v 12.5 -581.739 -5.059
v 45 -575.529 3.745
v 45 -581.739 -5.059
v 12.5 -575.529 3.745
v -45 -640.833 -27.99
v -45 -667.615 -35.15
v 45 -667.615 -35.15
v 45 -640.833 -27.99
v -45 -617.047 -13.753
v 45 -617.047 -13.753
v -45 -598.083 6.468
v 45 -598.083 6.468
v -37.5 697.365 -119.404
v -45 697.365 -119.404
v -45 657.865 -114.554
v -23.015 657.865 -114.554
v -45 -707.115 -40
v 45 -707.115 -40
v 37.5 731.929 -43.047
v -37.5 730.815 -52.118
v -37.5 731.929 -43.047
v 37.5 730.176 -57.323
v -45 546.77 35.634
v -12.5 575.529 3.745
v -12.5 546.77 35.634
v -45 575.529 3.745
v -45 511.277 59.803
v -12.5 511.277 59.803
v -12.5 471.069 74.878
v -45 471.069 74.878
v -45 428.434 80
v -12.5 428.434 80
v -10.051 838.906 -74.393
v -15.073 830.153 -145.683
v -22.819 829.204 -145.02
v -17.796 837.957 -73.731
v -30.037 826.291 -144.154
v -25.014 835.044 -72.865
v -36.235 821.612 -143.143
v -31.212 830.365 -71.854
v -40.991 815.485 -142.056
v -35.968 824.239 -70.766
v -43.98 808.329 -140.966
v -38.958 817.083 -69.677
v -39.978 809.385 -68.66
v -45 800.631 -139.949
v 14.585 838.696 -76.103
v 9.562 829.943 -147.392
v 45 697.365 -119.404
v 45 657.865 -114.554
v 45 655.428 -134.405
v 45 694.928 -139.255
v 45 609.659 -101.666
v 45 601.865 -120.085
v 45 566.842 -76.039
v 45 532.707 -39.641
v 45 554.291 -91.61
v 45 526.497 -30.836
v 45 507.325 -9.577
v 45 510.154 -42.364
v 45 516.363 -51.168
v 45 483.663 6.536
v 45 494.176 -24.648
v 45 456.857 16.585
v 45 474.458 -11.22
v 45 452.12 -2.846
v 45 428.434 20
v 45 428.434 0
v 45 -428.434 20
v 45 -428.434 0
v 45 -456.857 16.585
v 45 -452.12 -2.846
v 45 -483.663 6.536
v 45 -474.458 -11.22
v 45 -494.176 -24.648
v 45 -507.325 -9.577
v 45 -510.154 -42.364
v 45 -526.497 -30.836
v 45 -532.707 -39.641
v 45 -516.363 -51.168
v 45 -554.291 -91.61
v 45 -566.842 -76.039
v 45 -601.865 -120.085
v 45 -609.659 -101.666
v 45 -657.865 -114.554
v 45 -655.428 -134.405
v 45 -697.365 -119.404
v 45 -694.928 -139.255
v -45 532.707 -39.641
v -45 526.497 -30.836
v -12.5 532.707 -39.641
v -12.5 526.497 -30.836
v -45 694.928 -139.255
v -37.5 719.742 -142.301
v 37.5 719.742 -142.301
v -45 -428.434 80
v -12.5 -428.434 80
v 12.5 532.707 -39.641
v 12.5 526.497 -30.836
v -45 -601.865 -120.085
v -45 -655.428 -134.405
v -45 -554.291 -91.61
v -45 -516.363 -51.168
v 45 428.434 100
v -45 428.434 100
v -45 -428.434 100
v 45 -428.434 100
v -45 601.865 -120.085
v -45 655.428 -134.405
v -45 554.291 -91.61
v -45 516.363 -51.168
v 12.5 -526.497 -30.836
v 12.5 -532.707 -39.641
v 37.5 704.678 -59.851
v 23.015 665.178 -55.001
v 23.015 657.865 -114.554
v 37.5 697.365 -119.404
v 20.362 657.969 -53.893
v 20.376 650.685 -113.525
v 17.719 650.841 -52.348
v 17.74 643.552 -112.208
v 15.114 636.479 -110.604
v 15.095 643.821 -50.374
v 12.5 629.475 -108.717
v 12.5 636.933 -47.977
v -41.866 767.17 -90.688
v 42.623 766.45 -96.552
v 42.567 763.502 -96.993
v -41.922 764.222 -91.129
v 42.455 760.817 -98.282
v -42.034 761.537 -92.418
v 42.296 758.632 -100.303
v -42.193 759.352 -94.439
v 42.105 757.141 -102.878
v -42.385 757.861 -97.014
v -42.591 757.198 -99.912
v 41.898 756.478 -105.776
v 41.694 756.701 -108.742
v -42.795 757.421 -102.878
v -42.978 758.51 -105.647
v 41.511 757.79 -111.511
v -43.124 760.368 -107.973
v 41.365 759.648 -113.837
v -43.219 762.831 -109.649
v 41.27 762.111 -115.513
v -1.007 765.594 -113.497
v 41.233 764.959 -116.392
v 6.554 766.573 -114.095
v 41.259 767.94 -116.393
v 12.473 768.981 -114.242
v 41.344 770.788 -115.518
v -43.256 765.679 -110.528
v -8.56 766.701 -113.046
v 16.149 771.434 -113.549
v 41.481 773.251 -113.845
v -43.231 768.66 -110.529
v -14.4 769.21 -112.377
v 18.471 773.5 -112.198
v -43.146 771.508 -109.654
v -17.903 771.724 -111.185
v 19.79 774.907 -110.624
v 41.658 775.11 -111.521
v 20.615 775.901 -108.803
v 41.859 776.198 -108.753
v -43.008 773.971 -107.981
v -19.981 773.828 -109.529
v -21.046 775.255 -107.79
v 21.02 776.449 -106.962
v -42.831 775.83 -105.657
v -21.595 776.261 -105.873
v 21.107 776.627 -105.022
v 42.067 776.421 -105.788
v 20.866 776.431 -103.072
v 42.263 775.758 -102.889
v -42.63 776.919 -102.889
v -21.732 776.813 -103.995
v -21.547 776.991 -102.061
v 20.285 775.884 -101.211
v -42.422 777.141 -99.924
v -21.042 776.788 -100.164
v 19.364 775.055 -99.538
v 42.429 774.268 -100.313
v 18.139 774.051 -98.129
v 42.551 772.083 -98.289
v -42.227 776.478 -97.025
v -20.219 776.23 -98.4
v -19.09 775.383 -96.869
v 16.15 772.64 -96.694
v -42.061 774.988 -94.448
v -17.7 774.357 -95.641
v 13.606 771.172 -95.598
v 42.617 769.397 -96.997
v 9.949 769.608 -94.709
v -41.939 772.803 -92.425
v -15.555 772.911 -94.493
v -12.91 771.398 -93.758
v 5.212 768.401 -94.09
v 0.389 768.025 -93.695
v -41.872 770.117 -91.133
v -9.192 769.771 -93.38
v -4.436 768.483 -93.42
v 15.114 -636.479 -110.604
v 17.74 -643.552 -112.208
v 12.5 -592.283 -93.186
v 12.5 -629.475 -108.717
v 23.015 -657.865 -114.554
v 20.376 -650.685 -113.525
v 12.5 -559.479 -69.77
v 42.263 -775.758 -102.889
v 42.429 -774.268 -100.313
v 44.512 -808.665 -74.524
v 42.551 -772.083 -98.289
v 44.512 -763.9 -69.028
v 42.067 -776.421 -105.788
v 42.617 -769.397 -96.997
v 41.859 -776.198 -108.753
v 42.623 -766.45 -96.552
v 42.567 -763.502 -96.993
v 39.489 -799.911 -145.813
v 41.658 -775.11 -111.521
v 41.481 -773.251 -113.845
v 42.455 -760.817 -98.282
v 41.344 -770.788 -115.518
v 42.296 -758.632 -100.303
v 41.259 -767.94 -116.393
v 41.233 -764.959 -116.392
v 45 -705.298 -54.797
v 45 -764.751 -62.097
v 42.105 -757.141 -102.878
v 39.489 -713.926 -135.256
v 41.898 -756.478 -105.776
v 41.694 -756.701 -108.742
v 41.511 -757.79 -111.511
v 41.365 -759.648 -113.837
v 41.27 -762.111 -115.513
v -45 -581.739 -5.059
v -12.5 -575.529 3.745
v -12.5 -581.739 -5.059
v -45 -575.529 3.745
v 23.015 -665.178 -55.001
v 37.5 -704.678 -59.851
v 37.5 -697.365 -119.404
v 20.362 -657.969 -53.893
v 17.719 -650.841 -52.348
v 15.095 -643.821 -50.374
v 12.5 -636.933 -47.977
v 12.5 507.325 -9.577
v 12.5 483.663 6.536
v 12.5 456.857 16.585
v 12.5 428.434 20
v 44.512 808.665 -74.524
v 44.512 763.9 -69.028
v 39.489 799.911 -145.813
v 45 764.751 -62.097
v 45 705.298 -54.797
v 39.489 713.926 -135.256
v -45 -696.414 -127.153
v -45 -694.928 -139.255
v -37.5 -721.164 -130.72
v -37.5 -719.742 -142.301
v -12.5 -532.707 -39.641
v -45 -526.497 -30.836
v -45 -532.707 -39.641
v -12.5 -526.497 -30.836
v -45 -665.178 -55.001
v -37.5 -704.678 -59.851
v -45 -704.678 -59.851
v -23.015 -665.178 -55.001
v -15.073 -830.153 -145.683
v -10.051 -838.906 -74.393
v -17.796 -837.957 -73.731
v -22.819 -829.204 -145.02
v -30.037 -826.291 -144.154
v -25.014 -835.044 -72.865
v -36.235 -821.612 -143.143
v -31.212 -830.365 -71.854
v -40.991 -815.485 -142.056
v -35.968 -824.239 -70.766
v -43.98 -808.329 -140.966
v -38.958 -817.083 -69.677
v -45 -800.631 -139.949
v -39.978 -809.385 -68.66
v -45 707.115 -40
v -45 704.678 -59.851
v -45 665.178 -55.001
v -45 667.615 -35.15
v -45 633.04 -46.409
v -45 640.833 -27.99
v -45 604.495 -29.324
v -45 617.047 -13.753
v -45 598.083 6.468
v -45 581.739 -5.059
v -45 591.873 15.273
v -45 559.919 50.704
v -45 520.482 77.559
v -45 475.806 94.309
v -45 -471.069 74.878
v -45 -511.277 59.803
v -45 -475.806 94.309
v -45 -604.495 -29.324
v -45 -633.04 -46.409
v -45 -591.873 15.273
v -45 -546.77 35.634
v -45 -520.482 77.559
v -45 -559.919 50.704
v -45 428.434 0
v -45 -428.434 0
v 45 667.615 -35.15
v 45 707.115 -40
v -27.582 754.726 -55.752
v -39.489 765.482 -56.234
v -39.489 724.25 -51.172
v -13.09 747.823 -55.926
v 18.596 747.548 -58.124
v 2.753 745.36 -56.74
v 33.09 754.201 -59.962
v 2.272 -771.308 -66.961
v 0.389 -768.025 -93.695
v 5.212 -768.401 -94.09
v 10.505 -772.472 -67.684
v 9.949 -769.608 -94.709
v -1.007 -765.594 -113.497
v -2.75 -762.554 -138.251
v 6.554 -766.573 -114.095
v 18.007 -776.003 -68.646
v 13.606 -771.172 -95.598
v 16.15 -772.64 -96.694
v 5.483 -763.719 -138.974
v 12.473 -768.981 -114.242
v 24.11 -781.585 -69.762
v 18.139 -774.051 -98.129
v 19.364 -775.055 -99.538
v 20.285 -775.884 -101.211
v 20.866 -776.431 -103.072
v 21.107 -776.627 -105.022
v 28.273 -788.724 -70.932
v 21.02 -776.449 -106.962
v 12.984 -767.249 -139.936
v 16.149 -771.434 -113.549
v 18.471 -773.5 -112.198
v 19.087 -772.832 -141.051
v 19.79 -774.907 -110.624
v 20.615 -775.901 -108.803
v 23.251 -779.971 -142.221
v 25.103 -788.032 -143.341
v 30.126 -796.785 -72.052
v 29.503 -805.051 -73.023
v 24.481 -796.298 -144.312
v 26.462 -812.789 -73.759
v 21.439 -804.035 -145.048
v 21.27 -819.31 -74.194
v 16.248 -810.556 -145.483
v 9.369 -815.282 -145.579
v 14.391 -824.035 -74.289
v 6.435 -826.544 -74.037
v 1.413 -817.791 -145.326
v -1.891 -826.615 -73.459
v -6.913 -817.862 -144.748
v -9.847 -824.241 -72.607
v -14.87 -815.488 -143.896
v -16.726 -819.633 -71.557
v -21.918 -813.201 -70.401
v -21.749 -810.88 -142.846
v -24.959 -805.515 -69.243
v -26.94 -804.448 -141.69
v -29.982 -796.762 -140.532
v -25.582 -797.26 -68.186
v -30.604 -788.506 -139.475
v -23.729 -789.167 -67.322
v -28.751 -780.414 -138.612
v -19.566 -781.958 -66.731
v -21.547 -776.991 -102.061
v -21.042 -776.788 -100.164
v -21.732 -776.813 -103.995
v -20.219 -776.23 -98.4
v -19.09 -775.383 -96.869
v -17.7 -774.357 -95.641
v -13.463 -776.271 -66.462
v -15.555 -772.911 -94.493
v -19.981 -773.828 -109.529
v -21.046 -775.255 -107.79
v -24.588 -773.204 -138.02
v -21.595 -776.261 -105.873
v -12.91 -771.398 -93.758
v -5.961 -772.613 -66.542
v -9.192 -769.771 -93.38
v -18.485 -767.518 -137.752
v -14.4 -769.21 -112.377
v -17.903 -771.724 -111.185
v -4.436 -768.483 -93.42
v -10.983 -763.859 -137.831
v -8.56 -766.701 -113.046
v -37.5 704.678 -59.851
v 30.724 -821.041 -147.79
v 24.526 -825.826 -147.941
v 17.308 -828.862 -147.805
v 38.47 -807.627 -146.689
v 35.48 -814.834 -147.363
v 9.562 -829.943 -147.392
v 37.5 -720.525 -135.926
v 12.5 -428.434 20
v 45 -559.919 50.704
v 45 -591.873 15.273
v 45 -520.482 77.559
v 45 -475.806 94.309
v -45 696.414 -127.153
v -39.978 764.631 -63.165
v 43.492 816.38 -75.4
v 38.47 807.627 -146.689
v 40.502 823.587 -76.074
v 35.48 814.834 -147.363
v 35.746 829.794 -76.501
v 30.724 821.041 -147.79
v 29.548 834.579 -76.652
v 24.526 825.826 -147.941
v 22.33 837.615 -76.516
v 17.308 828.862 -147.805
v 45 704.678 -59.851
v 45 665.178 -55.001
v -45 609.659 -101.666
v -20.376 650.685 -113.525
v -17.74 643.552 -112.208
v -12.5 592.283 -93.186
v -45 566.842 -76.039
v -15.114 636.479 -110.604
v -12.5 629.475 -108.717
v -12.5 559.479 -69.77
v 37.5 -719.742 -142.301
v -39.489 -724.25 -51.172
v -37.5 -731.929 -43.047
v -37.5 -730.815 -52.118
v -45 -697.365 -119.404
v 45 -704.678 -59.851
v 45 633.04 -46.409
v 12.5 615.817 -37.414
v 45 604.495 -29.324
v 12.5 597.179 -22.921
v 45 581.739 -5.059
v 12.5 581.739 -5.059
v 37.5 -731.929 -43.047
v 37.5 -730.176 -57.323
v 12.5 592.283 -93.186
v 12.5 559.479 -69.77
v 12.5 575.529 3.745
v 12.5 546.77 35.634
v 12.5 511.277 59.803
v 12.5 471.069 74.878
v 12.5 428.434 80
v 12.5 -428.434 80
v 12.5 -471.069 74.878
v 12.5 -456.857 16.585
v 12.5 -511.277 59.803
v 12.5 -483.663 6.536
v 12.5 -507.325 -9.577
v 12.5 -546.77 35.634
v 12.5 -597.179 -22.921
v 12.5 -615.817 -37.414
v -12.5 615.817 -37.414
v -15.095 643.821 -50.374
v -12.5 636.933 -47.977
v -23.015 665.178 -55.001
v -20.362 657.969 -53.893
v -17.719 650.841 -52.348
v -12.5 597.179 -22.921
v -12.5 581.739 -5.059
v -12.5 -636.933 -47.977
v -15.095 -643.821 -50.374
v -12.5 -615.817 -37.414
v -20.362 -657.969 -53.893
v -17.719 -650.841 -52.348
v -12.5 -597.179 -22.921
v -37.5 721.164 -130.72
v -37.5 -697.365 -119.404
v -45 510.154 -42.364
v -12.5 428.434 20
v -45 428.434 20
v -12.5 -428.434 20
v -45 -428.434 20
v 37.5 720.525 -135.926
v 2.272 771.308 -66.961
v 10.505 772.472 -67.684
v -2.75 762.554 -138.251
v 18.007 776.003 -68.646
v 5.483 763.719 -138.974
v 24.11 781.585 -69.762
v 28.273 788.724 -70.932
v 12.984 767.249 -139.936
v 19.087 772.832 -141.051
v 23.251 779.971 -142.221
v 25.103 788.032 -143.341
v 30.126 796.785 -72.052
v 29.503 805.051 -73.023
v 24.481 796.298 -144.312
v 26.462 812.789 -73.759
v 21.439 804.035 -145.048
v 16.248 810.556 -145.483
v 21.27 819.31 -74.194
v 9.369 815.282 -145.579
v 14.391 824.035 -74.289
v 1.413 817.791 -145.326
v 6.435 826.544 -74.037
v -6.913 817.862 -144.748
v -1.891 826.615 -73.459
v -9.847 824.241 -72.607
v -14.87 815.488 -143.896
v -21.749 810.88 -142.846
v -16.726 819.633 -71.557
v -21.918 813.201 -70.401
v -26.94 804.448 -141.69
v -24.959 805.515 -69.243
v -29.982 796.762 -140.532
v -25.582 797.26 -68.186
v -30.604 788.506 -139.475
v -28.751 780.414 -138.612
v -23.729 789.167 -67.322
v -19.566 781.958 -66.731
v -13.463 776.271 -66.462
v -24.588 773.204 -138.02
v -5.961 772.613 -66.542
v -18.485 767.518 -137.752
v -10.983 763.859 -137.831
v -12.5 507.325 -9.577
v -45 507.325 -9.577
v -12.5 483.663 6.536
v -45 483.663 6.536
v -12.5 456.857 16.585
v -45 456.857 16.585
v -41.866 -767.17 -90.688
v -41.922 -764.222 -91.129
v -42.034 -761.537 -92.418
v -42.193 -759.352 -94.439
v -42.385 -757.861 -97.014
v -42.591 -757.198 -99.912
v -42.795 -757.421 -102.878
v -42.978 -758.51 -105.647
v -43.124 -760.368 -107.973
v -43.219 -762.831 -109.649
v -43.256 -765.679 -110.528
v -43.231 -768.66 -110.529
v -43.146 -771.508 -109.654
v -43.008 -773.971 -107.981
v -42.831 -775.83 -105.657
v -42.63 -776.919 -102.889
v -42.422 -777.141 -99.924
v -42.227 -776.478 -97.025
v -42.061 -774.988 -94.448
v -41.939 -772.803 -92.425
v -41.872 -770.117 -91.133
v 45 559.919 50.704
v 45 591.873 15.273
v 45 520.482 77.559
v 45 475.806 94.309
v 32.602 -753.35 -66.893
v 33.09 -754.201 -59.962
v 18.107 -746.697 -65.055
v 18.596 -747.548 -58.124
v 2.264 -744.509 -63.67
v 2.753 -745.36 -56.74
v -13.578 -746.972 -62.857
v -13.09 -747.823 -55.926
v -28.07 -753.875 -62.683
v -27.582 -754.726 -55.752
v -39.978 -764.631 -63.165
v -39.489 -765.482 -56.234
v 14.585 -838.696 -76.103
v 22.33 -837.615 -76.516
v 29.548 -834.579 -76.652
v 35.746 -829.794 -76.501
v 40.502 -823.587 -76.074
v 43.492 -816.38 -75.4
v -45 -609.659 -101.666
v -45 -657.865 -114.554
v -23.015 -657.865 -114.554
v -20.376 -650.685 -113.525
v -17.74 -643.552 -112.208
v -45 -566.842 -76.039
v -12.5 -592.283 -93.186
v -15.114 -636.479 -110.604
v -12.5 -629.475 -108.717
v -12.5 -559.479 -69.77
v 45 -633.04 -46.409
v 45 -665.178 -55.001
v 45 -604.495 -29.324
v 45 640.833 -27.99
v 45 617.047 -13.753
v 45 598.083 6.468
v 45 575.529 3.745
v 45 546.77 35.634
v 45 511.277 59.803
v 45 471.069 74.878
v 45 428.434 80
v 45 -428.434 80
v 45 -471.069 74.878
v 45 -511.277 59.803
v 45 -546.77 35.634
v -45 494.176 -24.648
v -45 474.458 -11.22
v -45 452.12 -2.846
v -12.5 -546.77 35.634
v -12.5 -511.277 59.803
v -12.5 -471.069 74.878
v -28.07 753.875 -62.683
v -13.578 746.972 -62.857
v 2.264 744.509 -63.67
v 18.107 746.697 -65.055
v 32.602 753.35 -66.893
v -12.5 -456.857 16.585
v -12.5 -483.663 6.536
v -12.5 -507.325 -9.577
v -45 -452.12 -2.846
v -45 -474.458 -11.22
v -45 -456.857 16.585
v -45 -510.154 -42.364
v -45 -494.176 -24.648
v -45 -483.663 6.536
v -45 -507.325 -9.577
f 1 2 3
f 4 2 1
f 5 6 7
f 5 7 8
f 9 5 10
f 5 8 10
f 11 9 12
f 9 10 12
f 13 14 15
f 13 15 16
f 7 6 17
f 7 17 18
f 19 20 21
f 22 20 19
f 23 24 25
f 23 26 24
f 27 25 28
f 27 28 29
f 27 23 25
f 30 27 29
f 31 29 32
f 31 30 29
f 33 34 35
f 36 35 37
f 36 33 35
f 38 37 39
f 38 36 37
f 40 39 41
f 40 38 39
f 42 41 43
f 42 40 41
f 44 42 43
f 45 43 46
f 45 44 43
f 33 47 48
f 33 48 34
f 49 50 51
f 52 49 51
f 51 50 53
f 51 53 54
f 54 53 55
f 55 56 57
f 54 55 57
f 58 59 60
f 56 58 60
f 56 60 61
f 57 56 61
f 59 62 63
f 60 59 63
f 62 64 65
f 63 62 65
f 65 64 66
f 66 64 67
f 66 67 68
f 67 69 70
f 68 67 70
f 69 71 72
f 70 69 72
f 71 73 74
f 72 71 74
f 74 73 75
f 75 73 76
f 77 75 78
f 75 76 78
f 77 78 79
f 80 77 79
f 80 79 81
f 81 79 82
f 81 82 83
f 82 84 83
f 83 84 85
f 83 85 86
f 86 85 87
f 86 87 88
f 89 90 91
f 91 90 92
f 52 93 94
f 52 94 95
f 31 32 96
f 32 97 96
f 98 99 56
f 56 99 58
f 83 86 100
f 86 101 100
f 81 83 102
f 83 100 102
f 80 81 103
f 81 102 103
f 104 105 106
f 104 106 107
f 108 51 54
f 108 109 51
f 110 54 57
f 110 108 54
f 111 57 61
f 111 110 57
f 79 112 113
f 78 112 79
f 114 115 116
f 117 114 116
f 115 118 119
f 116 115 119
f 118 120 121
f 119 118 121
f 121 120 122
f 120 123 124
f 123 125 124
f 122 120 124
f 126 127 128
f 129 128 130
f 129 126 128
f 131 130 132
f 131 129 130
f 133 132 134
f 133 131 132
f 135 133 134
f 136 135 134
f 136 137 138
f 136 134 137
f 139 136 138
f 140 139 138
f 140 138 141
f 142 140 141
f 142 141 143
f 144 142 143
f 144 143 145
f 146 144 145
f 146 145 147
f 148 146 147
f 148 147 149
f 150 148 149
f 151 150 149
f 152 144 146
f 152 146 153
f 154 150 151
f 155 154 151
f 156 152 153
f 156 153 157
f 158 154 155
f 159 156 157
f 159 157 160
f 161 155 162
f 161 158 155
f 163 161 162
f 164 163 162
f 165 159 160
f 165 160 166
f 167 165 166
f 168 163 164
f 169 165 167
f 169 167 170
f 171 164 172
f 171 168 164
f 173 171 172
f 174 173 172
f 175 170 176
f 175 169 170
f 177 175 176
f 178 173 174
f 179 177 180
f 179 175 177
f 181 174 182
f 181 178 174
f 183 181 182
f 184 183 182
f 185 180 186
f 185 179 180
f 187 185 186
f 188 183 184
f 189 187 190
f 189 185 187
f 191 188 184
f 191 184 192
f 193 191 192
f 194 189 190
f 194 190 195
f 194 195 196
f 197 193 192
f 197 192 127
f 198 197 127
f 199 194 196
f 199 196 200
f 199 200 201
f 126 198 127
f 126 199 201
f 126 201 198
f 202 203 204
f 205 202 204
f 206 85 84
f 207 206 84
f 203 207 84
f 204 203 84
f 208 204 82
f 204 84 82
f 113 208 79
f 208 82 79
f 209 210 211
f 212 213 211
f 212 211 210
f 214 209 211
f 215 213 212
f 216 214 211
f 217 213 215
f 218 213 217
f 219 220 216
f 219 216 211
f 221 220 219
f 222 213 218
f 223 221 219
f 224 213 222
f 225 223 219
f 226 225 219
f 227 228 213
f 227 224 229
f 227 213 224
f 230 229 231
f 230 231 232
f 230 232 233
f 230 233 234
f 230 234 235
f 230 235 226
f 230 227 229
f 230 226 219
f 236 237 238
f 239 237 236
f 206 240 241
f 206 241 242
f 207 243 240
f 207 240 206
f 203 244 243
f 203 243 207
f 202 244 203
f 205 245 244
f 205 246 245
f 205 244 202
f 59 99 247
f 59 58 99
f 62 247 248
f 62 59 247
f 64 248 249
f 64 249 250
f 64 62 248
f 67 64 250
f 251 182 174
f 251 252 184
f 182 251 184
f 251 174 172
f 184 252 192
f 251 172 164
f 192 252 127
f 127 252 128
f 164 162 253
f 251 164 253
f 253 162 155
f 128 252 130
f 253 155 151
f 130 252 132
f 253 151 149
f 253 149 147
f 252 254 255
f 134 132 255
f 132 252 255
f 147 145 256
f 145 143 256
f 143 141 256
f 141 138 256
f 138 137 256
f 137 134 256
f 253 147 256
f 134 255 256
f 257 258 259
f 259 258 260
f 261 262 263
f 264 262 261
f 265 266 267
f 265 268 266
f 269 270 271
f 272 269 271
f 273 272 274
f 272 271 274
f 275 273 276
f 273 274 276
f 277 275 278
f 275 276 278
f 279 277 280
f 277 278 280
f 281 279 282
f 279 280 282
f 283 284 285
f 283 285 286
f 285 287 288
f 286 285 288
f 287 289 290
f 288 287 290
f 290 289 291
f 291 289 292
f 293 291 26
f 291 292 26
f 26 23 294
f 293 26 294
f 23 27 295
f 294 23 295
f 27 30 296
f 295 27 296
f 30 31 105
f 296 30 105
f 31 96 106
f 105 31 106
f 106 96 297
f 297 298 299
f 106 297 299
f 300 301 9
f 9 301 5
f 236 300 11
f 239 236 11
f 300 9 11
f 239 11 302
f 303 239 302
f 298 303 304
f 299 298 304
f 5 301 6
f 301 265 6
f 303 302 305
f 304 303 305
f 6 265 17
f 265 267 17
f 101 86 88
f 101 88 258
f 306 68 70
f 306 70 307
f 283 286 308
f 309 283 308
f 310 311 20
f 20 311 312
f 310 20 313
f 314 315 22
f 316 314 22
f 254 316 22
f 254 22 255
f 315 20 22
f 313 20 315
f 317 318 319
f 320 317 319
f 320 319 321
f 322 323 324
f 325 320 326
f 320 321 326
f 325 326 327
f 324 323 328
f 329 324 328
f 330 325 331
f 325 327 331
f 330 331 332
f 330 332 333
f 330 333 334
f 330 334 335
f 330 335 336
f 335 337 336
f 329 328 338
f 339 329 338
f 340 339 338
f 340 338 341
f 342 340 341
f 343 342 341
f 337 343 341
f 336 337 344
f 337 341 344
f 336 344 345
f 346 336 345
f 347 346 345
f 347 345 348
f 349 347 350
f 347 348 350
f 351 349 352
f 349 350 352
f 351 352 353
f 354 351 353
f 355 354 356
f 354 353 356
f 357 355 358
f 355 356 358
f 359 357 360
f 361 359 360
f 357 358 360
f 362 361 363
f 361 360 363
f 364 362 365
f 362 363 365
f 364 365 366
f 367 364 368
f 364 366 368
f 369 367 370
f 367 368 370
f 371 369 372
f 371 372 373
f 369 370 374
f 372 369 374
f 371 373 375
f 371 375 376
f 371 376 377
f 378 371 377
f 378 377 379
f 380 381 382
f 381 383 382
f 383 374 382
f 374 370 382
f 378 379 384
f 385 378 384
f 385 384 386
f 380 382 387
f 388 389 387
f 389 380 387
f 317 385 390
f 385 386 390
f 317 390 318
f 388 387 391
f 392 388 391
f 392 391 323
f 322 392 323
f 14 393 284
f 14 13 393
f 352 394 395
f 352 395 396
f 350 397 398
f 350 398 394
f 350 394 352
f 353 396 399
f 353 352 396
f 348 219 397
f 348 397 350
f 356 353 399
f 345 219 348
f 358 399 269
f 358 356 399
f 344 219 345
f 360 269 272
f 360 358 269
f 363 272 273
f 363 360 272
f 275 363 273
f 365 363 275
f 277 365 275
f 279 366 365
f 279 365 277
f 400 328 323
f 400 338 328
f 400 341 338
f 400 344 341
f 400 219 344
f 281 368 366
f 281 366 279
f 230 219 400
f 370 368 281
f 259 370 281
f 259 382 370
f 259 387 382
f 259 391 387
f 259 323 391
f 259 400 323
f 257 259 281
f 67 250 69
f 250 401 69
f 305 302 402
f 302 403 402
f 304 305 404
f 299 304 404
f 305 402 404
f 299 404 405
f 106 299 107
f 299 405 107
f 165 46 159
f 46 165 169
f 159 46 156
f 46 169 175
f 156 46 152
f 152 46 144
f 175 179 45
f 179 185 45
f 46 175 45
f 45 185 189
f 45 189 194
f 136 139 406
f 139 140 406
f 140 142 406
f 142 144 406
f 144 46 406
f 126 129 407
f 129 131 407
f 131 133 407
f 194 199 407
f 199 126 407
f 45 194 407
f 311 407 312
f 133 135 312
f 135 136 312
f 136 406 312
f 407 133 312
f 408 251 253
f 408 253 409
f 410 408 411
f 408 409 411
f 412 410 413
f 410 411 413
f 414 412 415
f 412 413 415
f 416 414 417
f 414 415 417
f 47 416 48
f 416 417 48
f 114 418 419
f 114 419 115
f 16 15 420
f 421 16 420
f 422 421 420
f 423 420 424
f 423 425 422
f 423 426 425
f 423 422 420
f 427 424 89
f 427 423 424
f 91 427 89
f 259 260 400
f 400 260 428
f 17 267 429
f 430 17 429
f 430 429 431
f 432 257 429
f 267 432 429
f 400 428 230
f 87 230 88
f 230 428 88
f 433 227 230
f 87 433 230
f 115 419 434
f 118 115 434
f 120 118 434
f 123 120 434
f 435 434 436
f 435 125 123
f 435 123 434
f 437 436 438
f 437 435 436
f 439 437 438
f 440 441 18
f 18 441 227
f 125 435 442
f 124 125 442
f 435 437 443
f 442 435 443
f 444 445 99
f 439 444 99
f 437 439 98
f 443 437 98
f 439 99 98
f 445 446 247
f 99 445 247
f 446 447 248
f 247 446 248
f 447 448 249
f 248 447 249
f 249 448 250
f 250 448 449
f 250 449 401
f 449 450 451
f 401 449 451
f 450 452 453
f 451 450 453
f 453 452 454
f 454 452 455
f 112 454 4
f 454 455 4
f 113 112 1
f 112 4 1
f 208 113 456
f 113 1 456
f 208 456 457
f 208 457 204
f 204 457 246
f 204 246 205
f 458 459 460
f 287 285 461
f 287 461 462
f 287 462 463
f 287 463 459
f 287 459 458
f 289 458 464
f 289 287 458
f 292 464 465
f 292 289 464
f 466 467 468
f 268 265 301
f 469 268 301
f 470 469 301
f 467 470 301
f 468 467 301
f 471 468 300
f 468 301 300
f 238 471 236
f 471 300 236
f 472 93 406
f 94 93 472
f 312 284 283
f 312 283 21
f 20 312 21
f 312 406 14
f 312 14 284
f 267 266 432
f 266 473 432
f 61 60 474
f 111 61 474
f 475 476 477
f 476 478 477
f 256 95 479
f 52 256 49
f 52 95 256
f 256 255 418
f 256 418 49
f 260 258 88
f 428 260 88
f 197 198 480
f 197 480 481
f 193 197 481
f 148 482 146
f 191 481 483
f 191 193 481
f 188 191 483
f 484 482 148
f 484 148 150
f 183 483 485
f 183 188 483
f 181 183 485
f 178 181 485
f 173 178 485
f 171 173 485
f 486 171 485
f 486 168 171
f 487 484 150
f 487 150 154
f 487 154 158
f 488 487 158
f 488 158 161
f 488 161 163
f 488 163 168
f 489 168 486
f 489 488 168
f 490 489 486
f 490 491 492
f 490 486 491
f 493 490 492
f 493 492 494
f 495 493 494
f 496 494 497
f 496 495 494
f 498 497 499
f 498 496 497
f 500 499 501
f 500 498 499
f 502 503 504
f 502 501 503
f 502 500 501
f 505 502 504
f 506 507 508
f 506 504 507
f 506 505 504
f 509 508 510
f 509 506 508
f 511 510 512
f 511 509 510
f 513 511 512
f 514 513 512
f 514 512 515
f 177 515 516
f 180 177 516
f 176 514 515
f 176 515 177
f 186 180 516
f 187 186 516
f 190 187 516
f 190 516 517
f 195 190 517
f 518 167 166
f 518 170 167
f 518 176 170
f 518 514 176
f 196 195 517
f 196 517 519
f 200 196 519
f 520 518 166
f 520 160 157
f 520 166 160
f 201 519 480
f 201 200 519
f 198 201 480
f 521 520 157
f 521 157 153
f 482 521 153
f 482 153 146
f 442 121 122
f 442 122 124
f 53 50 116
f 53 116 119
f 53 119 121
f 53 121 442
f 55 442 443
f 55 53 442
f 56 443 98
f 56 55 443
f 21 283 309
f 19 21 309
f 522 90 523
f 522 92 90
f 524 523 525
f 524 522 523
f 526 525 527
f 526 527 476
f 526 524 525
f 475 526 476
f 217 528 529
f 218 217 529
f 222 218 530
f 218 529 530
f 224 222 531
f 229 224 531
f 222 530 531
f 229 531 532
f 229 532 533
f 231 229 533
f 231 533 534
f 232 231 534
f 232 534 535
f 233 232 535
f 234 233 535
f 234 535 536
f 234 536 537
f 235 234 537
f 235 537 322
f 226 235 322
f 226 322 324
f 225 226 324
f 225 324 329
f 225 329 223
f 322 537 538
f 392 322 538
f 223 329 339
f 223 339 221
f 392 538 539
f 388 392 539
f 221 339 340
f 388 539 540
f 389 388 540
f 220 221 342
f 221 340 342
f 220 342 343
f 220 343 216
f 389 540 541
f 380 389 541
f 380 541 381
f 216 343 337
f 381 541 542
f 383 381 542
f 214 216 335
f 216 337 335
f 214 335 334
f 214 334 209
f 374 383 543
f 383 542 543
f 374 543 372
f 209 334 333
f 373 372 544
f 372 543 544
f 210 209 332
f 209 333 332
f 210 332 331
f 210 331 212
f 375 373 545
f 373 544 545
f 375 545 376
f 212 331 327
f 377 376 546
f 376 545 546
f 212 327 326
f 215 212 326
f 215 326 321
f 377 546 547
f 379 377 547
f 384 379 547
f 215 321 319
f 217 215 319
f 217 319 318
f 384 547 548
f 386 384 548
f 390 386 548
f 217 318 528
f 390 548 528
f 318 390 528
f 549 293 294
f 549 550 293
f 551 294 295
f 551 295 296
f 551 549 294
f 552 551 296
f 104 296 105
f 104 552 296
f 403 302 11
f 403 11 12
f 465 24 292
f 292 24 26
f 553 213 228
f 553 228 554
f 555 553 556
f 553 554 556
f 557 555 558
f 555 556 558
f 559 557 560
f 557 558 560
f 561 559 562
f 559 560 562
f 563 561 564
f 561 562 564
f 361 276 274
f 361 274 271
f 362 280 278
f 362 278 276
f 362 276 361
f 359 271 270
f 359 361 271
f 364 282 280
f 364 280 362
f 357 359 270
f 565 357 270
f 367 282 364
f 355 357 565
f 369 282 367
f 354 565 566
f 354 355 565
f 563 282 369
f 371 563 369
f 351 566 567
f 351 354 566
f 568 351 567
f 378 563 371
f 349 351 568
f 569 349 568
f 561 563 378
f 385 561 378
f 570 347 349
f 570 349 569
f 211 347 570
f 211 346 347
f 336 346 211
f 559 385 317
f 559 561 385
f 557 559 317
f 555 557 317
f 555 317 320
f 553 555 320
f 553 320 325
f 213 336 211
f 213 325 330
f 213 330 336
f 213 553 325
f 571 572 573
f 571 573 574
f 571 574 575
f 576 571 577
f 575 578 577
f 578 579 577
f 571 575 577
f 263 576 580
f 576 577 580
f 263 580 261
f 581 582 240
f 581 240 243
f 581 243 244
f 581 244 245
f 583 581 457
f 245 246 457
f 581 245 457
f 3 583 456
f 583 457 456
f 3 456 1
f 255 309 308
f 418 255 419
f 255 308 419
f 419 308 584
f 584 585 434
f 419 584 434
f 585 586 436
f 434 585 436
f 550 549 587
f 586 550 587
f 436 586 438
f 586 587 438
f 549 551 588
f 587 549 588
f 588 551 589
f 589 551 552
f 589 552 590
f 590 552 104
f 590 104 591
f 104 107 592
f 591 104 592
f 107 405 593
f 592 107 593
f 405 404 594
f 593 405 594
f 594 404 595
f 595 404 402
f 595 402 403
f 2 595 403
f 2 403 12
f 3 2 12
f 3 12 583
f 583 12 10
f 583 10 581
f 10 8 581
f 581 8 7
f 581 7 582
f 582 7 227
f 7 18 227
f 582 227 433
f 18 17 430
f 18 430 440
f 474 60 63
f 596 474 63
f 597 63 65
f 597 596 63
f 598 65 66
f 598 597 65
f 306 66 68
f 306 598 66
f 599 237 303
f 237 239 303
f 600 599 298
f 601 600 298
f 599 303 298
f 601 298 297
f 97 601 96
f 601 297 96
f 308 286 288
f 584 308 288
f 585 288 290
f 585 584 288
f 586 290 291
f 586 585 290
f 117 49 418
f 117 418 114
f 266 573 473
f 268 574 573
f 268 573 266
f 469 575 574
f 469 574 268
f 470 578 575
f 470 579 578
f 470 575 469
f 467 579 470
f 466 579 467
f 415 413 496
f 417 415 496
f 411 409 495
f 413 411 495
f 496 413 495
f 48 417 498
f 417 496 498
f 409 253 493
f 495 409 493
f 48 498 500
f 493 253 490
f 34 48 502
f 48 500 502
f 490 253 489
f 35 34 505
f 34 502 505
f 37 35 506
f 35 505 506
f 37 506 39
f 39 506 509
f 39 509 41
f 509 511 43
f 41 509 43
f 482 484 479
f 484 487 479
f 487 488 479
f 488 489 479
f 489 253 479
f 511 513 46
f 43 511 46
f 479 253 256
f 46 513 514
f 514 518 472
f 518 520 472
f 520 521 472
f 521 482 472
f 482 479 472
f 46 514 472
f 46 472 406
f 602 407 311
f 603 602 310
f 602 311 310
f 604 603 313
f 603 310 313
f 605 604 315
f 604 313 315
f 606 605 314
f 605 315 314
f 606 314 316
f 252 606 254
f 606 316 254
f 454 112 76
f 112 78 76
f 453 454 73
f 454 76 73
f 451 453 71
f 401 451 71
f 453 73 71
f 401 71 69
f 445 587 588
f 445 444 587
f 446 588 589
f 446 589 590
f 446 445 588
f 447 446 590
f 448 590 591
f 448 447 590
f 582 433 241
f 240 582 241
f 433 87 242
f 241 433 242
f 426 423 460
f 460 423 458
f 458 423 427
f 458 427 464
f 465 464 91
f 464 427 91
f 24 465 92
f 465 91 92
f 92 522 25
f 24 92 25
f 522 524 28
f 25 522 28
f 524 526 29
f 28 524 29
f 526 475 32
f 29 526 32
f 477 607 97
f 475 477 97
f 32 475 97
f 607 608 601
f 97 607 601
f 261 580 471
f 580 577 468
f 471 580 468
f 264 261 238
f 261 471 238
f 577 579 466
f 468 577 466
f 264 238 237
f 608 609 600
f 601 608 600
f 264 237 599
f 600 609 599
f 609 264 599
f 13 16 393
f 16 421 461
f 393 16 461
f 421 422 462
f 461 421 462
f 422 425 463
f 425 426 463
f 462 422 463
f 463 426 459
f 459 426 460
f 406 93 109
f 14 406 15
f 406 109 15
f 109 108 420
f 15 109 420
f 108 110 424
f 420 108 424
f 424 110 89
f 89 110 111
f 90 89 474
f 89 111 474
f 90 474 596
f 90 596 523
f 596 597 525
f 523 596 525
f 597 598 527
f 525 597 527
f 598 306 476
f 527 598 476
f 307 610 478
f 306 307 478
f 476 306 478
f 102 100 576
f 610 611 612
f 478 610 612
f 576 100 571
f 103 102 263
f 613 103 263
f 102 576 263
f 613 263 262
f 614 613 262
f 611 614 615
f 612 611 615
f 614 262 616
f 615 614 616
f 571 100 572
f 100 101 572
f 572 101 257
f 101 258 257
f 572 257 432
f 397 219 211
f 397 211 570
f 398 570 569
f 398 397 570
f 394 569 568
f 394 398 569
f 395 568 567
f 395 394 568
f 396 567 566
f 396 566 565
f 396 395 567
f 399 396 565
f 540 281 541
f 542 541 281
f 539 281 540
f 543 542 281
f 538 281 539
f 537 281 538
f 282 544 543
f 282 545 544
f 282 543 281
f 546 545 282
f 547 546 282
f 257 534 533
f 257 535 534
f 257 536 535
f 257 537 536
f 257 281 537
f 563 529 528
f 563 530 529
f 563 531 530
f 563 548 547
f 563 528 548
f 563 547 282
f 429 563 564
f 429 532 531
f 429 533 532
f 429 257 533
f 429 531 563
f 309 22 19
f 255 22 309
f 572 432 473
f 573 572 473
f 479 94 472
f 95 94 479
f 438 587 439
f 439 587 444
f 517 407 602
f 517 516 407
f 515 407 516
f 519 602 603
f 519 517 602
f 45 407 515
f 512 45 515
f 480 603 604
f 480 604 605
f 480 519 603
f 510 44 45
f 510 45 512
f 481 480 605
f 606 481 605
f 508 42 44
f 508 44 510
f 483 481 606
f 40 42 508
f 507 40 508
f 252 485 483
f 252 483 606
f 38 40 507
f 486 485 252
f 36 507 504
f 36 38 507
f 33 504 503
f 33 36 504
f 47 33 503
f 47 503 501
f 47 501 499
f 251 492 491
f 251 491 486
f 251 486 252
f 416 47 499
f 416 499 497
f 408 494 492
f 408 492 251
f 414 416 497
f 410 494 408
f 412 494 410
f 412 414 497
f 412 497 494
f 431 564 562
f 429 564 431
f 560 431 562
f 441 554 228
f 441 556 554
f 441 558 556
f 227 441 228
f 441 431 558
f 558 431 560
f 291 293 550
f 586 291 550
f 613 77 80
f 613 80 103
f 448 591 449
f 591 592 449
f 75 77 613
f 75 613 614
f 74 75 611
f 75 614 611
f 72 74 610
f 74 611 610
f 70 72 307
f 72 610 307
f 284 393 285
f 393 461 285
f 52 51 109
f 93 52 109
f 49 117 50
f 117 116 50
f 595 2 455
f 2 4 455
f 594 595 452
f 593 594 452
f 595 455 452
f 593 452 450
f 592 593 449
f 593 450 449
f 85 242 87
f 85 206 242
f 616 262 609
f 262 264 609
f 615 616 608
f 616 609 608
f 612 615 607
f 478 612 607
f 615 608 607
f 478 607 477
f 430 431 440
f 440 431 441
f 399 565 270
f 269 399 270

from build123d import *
from OCP.BRepFilletAPI import BRepFilletAPI_MakeChamfer

# Parameters (mm, degrees)
BOSS_EXTRUDE3_DEPTH       = 100
BOSS_EXTRUDE4_START       = -25
BOSS_EXTRUDE4_DEPTH       = 135
FILLET2_R                 = 30
SKETCH8_R                 = 28
CUT_EXTRUDE2_DEPTH        = 85
CHAMFER2_SIZE             = 25
CHAMFER2_SIZE2            = 68.686935486
SKETCH9_R                 = 10
CUT_EXTRUDE3_DEPTH        = 858.264154976
FILLET2_OF_MIRROR1_R      = 30
CHAMFER2_OF_MIRROR1_SIZE  = 25
CHAMFER2_OF_MIRROR1_SIZE2 = 68.686935486
SKETCH10_R                = 55
CUT_EXTRUDE4_DEPTH        = 7
SKETCH11_R                = 55
CUT_EXTRUDE5_DEPTH        = 7


with BuildPart() as part:
    # Sweep3: sweep along a path in Sketch2
    with BuildLine(Plane(origin=(0, 0, 0), x_dir=(0, 0, -1), z_dir=(1, 0, 0))) as sweep3_path:
        Line((40, -707.115), (35.150009844, -667.615))
        ThreePointArc((35.150009844, -667.615), (21.699722473, -628.444195566), (-6.468256478, -598.082589677))
        Line((-6.468256478, -598.082589677), (-15.272697684, -591.87285015))
        ThreePointArc((-15.272697684, -591.87285015), (-77.559200743, -520.481595506), (-100, -428.434160824))
        Line((-100, -428.434160824), (-100, -372.115))
        Line((-100, -372.115), (-100, 0))
    # Sketch1 → Sweep3 (sweep)
    with BuildSketch(Plane(origin=(0, 0, 0), x_dir=(1, 0, 0), z_dir=(0, 1, 0))):
        Polygon((-45, 0), (-45, -20), (-12.5, -20), (-12.5, -80), (-45, -80), (-45, -100), (45, -100), (45, -80), (12.5, -80), (12.5, -20), (45, -20), (45, 0), align=None)
    sweep3 = sweep(path=sweep3_path.line)

    # Sketch6 → Boss-Extrude3 (add)
    with BuildSketch(Plane(origin=(0, 6.523203495, -53.127229086), x_dir=(-1, 0, 0), z_dir=(0, 0.12186934340514098, -0.992546151641323))):
        Polygon((-45, -706.719045754), (45, -706.719045754), (37.5, -731.719045754), (-37.5, -731.719045754), align=None)
    boss_extrude3 = extrude(amount=-BOSS_EXTRUDE3_DEPTH)

    # Sketch7 → Boss-Extrude4 (add)
    with BuildSketch(Plane(origin=(0, -726.264922946, -89.174119663), x_dir=(1, 0, 0), z_dir=(0, -0.992546151641323, -0.12186934340514098)).offset(BOSS_EXTRUDE4_START)):
        Polygon((-39.489238574, 37.473794696), (45, 31.565731599), (39.489238574, -47.241828371), (-45, -41.333765274), align=None)
    boss_extrude4 = extrude(amount=BOSS_EXTRUDE4_DEPTH)

    # Fillet2
    fillet2_edges = [part.edges().sort_by_distance(p)[0] for p in [
        (-42.244619287, -835.209793586, -104.495346909),
        (42.244619287, -834.489781816, -110.3593722),
    ]]
    fillet(fillet2_edges, radius=FILLET2_R)

    # Sketch8 → Cut-Extrude2 (cut)
    with BuildSketch(Plane(origin=(-3.095242597, 5.394428439, -43.934093987), x_dir=(-0.9975640426646005, -0.00837869546975235, 0.06925155770727769), z_dir=(-0.06975647374412558, 0.12157247580973782, -0.9901283591011198))):
        with Locations(Location((-0.444559855, -801.718997, 0), (0, 0, 89.992929705))):
            Circle(SKETCH8_R)
    cut_extrude2 = extrude(amount=-CUT_EXTRUDE2_DEPTH, mode=Mode.SUBTRACT)

    # Chamfer2: one chamfer whose edges measure the first distance from different faces: ONE call of the kernel's chamfer builder (chamfer() names one face for all edges)
    chamfer2_edges_1 = [part.edges().sort_by_distance(p)[0] for p in [
        (12.5, -701.02153283, -89.627307582),
    ]]
    chamfer2_side_1 = [part.faces().sort_by_distance(p)[0] for p in [
        (28.75, -701.02153283, -89.627307582),
    ]]
    chamfer2_edges_2 = [part.edges().sort_by_distance(p)[0] for p in [
        (-12.5, -701.02153283, -89.627307582),
    ]]
    chamfer2_side_2 = [part.faces().sort_by_distance(p)[0] for p in [
        (-28.75, -701.02153283, -89.627307582),
    ]]
    chamfer2 = BRepFilletAPI_MakeChamfer(part.part.solid().wrapped)
    for e in chamfer2_edges_1:
        chamfer2.Add(CHAMFER2_SIZE, CHAMFER2_SIZE2, e.wrapped, chamfer2_side_1[0].wrapped)  # the first distance lies on this face
    for e in chamfer2_edges_2:
        chamfer2.Add(CHAMFER2_SIZE, CHAMFER2_SIZE2, e.wrapped, chamfer2_side_2[0].wrapped)  # the first distance lies on this face
    add(Compound.cast(chamfer2.Shape()), mode=Mode.REPLACE)

    # Sketch9 → Cut-Extrude3 (cut, through all)
    with BuildSketch(Plane(origin=(-41.904757403, -0.357109604, 2.908424331), x_dir=(0.06923400560903198, 0.0005900076719097519, 0.9976002728339021), z_dir=(-0.9975640502598241, -0.008501175653454889, 0.06923651956680364))):
        with Locations(Location((-103.821376482, -766.779055644, 0), (0, 0, 359.966193827))):
            Circle(SKETCH9_R)
    cut_extrude3 = extrude(amount=-CUT_EXTRUDE3_DEPTH, mode=Mode.SUBTRACT)

    # Mirror1: Sweep3, Boss-Extrude3, Boss-Extrude4, Cut-Extrude2, Cut-Extrude3 across plane
    add(sweep3.mirror(Plane.ZX))
    add(boss_extrude3.mirror(Plane.ZX))
    add(boss_extrude4.mirror(Plane.ZX))
    add(cut_extrude2.mirror(Plane.ZX), mode=Mode.SUBTRACT)
    add(cut_extrude3.mirror(Plane.ZX), mode=Mode.SUBTRACT)

    # Fillet2 of Mirror1
    fillet2_of_mirror1_edges = [part.edges().sort_by_distance(p)[0] for p in [
        (-42.244619287, 835.209793586, -104.495346909),
        (42.244619287, 834.489781816, -110.3593722),
    ]]
    fillet(fillet2_of_mirror1_edges, radius=FILLET2_OF_MIRROR1_R)

    # Chamfer2 of Mirror1: one chamfer whose edges measure the first distance from different faces: ONE call of the kernel's chamfer builder (chamfer() names one face for all edges)
    chamfer2_of_mirror1_edges_1 = [part.edges().sort_by_distance(p)[0] for p in [
        (12.5, 701.02153283, -89.627307582),
    ]]
    chamfer2_of_mirror1_side_1 = [part.faces().sort_by_distance(p)[0] for p in [
        (28.75, 701.02153283, -89.627307582),
    ]]
    chamfer2_of_mirror1_edges_2 = [part.edges().sort_by_distance(p)[0] for p in [
        (-12.5, 701.02153283, -89.627307582),
    ]]
    chamfer2_of_mirror1_side_2 = [part.faces().sort_by_distance(p)[0] for p in [
        (-28.75, 701.02153283, -89.627307582),
    ]]
    chamfer2_of_mirror1 = BRepFilletAPI_MakeChamfer(part.part.solid().wrapped)
    for e in chamfer2_of_mirror1_edges_1:
        chamfer2_of_mirror1.Add(CHAMFER2_OF_MIRROR1_SIZE, CHAMFER2_OF_MIRROR1_SIZE2, e.wrapped, chamfer2_of_mirror1_side_1[0].wrapped)  # the first distance lies on this face
    for e in chamfer2_of_mirror1_edges_2:
        chamfer2_of_mirror1.Add(CHAMFER2_OF_MIRROR1_SIZE, CHAMFER2_OF_MIRROR1_SIZE2, e.wrapped, chamfer2_of_mirror1_side_2[0].wrapped)  # the first distance lies on this face
    add(Compound.cast(chamfer2_of_mirror1.Shape()), mode=Mode.REPLACE)

    # Sketch10 → Cut-Extrude4 (cut)
    with BuildSketch(Plane(origin=(2.415518829, 4.20979715, 34.286046382), x_dir=(0.9975640502598243, -0.008501175653454538, -0.06923651956680081), z_dir=(0.06975647374412557, 0.12157247580973786, 0.9901283591011197))):
        with Locations((0.345627789, 801.719045754)):
            Circle(SKETCH10_R)
    extrude(amount=-CUT_EXTRUDE4_DEPTH, mode=Mode.SUBTRACT)

    # Sketch11 → Cut-Extrude5 (cut)
    with BuildSketch(Plane(origin=(2.415518829, -4.20979715, 34.286046382), x_dir=(0.9975640502598243, 0.008501175653454538, -0.06923651956680081), z_dir=(0.06975647374412557, -0.12157247580973786, 0.9901283591011197))):
        with Locations((0.345627789, -801.719045754)):
            Circle(SKETCH11_R)
    extrude(amount=-CUT_EXTRUDE5_DEPTH, mode=Mode.SUBTRACT)


solid = part.part
